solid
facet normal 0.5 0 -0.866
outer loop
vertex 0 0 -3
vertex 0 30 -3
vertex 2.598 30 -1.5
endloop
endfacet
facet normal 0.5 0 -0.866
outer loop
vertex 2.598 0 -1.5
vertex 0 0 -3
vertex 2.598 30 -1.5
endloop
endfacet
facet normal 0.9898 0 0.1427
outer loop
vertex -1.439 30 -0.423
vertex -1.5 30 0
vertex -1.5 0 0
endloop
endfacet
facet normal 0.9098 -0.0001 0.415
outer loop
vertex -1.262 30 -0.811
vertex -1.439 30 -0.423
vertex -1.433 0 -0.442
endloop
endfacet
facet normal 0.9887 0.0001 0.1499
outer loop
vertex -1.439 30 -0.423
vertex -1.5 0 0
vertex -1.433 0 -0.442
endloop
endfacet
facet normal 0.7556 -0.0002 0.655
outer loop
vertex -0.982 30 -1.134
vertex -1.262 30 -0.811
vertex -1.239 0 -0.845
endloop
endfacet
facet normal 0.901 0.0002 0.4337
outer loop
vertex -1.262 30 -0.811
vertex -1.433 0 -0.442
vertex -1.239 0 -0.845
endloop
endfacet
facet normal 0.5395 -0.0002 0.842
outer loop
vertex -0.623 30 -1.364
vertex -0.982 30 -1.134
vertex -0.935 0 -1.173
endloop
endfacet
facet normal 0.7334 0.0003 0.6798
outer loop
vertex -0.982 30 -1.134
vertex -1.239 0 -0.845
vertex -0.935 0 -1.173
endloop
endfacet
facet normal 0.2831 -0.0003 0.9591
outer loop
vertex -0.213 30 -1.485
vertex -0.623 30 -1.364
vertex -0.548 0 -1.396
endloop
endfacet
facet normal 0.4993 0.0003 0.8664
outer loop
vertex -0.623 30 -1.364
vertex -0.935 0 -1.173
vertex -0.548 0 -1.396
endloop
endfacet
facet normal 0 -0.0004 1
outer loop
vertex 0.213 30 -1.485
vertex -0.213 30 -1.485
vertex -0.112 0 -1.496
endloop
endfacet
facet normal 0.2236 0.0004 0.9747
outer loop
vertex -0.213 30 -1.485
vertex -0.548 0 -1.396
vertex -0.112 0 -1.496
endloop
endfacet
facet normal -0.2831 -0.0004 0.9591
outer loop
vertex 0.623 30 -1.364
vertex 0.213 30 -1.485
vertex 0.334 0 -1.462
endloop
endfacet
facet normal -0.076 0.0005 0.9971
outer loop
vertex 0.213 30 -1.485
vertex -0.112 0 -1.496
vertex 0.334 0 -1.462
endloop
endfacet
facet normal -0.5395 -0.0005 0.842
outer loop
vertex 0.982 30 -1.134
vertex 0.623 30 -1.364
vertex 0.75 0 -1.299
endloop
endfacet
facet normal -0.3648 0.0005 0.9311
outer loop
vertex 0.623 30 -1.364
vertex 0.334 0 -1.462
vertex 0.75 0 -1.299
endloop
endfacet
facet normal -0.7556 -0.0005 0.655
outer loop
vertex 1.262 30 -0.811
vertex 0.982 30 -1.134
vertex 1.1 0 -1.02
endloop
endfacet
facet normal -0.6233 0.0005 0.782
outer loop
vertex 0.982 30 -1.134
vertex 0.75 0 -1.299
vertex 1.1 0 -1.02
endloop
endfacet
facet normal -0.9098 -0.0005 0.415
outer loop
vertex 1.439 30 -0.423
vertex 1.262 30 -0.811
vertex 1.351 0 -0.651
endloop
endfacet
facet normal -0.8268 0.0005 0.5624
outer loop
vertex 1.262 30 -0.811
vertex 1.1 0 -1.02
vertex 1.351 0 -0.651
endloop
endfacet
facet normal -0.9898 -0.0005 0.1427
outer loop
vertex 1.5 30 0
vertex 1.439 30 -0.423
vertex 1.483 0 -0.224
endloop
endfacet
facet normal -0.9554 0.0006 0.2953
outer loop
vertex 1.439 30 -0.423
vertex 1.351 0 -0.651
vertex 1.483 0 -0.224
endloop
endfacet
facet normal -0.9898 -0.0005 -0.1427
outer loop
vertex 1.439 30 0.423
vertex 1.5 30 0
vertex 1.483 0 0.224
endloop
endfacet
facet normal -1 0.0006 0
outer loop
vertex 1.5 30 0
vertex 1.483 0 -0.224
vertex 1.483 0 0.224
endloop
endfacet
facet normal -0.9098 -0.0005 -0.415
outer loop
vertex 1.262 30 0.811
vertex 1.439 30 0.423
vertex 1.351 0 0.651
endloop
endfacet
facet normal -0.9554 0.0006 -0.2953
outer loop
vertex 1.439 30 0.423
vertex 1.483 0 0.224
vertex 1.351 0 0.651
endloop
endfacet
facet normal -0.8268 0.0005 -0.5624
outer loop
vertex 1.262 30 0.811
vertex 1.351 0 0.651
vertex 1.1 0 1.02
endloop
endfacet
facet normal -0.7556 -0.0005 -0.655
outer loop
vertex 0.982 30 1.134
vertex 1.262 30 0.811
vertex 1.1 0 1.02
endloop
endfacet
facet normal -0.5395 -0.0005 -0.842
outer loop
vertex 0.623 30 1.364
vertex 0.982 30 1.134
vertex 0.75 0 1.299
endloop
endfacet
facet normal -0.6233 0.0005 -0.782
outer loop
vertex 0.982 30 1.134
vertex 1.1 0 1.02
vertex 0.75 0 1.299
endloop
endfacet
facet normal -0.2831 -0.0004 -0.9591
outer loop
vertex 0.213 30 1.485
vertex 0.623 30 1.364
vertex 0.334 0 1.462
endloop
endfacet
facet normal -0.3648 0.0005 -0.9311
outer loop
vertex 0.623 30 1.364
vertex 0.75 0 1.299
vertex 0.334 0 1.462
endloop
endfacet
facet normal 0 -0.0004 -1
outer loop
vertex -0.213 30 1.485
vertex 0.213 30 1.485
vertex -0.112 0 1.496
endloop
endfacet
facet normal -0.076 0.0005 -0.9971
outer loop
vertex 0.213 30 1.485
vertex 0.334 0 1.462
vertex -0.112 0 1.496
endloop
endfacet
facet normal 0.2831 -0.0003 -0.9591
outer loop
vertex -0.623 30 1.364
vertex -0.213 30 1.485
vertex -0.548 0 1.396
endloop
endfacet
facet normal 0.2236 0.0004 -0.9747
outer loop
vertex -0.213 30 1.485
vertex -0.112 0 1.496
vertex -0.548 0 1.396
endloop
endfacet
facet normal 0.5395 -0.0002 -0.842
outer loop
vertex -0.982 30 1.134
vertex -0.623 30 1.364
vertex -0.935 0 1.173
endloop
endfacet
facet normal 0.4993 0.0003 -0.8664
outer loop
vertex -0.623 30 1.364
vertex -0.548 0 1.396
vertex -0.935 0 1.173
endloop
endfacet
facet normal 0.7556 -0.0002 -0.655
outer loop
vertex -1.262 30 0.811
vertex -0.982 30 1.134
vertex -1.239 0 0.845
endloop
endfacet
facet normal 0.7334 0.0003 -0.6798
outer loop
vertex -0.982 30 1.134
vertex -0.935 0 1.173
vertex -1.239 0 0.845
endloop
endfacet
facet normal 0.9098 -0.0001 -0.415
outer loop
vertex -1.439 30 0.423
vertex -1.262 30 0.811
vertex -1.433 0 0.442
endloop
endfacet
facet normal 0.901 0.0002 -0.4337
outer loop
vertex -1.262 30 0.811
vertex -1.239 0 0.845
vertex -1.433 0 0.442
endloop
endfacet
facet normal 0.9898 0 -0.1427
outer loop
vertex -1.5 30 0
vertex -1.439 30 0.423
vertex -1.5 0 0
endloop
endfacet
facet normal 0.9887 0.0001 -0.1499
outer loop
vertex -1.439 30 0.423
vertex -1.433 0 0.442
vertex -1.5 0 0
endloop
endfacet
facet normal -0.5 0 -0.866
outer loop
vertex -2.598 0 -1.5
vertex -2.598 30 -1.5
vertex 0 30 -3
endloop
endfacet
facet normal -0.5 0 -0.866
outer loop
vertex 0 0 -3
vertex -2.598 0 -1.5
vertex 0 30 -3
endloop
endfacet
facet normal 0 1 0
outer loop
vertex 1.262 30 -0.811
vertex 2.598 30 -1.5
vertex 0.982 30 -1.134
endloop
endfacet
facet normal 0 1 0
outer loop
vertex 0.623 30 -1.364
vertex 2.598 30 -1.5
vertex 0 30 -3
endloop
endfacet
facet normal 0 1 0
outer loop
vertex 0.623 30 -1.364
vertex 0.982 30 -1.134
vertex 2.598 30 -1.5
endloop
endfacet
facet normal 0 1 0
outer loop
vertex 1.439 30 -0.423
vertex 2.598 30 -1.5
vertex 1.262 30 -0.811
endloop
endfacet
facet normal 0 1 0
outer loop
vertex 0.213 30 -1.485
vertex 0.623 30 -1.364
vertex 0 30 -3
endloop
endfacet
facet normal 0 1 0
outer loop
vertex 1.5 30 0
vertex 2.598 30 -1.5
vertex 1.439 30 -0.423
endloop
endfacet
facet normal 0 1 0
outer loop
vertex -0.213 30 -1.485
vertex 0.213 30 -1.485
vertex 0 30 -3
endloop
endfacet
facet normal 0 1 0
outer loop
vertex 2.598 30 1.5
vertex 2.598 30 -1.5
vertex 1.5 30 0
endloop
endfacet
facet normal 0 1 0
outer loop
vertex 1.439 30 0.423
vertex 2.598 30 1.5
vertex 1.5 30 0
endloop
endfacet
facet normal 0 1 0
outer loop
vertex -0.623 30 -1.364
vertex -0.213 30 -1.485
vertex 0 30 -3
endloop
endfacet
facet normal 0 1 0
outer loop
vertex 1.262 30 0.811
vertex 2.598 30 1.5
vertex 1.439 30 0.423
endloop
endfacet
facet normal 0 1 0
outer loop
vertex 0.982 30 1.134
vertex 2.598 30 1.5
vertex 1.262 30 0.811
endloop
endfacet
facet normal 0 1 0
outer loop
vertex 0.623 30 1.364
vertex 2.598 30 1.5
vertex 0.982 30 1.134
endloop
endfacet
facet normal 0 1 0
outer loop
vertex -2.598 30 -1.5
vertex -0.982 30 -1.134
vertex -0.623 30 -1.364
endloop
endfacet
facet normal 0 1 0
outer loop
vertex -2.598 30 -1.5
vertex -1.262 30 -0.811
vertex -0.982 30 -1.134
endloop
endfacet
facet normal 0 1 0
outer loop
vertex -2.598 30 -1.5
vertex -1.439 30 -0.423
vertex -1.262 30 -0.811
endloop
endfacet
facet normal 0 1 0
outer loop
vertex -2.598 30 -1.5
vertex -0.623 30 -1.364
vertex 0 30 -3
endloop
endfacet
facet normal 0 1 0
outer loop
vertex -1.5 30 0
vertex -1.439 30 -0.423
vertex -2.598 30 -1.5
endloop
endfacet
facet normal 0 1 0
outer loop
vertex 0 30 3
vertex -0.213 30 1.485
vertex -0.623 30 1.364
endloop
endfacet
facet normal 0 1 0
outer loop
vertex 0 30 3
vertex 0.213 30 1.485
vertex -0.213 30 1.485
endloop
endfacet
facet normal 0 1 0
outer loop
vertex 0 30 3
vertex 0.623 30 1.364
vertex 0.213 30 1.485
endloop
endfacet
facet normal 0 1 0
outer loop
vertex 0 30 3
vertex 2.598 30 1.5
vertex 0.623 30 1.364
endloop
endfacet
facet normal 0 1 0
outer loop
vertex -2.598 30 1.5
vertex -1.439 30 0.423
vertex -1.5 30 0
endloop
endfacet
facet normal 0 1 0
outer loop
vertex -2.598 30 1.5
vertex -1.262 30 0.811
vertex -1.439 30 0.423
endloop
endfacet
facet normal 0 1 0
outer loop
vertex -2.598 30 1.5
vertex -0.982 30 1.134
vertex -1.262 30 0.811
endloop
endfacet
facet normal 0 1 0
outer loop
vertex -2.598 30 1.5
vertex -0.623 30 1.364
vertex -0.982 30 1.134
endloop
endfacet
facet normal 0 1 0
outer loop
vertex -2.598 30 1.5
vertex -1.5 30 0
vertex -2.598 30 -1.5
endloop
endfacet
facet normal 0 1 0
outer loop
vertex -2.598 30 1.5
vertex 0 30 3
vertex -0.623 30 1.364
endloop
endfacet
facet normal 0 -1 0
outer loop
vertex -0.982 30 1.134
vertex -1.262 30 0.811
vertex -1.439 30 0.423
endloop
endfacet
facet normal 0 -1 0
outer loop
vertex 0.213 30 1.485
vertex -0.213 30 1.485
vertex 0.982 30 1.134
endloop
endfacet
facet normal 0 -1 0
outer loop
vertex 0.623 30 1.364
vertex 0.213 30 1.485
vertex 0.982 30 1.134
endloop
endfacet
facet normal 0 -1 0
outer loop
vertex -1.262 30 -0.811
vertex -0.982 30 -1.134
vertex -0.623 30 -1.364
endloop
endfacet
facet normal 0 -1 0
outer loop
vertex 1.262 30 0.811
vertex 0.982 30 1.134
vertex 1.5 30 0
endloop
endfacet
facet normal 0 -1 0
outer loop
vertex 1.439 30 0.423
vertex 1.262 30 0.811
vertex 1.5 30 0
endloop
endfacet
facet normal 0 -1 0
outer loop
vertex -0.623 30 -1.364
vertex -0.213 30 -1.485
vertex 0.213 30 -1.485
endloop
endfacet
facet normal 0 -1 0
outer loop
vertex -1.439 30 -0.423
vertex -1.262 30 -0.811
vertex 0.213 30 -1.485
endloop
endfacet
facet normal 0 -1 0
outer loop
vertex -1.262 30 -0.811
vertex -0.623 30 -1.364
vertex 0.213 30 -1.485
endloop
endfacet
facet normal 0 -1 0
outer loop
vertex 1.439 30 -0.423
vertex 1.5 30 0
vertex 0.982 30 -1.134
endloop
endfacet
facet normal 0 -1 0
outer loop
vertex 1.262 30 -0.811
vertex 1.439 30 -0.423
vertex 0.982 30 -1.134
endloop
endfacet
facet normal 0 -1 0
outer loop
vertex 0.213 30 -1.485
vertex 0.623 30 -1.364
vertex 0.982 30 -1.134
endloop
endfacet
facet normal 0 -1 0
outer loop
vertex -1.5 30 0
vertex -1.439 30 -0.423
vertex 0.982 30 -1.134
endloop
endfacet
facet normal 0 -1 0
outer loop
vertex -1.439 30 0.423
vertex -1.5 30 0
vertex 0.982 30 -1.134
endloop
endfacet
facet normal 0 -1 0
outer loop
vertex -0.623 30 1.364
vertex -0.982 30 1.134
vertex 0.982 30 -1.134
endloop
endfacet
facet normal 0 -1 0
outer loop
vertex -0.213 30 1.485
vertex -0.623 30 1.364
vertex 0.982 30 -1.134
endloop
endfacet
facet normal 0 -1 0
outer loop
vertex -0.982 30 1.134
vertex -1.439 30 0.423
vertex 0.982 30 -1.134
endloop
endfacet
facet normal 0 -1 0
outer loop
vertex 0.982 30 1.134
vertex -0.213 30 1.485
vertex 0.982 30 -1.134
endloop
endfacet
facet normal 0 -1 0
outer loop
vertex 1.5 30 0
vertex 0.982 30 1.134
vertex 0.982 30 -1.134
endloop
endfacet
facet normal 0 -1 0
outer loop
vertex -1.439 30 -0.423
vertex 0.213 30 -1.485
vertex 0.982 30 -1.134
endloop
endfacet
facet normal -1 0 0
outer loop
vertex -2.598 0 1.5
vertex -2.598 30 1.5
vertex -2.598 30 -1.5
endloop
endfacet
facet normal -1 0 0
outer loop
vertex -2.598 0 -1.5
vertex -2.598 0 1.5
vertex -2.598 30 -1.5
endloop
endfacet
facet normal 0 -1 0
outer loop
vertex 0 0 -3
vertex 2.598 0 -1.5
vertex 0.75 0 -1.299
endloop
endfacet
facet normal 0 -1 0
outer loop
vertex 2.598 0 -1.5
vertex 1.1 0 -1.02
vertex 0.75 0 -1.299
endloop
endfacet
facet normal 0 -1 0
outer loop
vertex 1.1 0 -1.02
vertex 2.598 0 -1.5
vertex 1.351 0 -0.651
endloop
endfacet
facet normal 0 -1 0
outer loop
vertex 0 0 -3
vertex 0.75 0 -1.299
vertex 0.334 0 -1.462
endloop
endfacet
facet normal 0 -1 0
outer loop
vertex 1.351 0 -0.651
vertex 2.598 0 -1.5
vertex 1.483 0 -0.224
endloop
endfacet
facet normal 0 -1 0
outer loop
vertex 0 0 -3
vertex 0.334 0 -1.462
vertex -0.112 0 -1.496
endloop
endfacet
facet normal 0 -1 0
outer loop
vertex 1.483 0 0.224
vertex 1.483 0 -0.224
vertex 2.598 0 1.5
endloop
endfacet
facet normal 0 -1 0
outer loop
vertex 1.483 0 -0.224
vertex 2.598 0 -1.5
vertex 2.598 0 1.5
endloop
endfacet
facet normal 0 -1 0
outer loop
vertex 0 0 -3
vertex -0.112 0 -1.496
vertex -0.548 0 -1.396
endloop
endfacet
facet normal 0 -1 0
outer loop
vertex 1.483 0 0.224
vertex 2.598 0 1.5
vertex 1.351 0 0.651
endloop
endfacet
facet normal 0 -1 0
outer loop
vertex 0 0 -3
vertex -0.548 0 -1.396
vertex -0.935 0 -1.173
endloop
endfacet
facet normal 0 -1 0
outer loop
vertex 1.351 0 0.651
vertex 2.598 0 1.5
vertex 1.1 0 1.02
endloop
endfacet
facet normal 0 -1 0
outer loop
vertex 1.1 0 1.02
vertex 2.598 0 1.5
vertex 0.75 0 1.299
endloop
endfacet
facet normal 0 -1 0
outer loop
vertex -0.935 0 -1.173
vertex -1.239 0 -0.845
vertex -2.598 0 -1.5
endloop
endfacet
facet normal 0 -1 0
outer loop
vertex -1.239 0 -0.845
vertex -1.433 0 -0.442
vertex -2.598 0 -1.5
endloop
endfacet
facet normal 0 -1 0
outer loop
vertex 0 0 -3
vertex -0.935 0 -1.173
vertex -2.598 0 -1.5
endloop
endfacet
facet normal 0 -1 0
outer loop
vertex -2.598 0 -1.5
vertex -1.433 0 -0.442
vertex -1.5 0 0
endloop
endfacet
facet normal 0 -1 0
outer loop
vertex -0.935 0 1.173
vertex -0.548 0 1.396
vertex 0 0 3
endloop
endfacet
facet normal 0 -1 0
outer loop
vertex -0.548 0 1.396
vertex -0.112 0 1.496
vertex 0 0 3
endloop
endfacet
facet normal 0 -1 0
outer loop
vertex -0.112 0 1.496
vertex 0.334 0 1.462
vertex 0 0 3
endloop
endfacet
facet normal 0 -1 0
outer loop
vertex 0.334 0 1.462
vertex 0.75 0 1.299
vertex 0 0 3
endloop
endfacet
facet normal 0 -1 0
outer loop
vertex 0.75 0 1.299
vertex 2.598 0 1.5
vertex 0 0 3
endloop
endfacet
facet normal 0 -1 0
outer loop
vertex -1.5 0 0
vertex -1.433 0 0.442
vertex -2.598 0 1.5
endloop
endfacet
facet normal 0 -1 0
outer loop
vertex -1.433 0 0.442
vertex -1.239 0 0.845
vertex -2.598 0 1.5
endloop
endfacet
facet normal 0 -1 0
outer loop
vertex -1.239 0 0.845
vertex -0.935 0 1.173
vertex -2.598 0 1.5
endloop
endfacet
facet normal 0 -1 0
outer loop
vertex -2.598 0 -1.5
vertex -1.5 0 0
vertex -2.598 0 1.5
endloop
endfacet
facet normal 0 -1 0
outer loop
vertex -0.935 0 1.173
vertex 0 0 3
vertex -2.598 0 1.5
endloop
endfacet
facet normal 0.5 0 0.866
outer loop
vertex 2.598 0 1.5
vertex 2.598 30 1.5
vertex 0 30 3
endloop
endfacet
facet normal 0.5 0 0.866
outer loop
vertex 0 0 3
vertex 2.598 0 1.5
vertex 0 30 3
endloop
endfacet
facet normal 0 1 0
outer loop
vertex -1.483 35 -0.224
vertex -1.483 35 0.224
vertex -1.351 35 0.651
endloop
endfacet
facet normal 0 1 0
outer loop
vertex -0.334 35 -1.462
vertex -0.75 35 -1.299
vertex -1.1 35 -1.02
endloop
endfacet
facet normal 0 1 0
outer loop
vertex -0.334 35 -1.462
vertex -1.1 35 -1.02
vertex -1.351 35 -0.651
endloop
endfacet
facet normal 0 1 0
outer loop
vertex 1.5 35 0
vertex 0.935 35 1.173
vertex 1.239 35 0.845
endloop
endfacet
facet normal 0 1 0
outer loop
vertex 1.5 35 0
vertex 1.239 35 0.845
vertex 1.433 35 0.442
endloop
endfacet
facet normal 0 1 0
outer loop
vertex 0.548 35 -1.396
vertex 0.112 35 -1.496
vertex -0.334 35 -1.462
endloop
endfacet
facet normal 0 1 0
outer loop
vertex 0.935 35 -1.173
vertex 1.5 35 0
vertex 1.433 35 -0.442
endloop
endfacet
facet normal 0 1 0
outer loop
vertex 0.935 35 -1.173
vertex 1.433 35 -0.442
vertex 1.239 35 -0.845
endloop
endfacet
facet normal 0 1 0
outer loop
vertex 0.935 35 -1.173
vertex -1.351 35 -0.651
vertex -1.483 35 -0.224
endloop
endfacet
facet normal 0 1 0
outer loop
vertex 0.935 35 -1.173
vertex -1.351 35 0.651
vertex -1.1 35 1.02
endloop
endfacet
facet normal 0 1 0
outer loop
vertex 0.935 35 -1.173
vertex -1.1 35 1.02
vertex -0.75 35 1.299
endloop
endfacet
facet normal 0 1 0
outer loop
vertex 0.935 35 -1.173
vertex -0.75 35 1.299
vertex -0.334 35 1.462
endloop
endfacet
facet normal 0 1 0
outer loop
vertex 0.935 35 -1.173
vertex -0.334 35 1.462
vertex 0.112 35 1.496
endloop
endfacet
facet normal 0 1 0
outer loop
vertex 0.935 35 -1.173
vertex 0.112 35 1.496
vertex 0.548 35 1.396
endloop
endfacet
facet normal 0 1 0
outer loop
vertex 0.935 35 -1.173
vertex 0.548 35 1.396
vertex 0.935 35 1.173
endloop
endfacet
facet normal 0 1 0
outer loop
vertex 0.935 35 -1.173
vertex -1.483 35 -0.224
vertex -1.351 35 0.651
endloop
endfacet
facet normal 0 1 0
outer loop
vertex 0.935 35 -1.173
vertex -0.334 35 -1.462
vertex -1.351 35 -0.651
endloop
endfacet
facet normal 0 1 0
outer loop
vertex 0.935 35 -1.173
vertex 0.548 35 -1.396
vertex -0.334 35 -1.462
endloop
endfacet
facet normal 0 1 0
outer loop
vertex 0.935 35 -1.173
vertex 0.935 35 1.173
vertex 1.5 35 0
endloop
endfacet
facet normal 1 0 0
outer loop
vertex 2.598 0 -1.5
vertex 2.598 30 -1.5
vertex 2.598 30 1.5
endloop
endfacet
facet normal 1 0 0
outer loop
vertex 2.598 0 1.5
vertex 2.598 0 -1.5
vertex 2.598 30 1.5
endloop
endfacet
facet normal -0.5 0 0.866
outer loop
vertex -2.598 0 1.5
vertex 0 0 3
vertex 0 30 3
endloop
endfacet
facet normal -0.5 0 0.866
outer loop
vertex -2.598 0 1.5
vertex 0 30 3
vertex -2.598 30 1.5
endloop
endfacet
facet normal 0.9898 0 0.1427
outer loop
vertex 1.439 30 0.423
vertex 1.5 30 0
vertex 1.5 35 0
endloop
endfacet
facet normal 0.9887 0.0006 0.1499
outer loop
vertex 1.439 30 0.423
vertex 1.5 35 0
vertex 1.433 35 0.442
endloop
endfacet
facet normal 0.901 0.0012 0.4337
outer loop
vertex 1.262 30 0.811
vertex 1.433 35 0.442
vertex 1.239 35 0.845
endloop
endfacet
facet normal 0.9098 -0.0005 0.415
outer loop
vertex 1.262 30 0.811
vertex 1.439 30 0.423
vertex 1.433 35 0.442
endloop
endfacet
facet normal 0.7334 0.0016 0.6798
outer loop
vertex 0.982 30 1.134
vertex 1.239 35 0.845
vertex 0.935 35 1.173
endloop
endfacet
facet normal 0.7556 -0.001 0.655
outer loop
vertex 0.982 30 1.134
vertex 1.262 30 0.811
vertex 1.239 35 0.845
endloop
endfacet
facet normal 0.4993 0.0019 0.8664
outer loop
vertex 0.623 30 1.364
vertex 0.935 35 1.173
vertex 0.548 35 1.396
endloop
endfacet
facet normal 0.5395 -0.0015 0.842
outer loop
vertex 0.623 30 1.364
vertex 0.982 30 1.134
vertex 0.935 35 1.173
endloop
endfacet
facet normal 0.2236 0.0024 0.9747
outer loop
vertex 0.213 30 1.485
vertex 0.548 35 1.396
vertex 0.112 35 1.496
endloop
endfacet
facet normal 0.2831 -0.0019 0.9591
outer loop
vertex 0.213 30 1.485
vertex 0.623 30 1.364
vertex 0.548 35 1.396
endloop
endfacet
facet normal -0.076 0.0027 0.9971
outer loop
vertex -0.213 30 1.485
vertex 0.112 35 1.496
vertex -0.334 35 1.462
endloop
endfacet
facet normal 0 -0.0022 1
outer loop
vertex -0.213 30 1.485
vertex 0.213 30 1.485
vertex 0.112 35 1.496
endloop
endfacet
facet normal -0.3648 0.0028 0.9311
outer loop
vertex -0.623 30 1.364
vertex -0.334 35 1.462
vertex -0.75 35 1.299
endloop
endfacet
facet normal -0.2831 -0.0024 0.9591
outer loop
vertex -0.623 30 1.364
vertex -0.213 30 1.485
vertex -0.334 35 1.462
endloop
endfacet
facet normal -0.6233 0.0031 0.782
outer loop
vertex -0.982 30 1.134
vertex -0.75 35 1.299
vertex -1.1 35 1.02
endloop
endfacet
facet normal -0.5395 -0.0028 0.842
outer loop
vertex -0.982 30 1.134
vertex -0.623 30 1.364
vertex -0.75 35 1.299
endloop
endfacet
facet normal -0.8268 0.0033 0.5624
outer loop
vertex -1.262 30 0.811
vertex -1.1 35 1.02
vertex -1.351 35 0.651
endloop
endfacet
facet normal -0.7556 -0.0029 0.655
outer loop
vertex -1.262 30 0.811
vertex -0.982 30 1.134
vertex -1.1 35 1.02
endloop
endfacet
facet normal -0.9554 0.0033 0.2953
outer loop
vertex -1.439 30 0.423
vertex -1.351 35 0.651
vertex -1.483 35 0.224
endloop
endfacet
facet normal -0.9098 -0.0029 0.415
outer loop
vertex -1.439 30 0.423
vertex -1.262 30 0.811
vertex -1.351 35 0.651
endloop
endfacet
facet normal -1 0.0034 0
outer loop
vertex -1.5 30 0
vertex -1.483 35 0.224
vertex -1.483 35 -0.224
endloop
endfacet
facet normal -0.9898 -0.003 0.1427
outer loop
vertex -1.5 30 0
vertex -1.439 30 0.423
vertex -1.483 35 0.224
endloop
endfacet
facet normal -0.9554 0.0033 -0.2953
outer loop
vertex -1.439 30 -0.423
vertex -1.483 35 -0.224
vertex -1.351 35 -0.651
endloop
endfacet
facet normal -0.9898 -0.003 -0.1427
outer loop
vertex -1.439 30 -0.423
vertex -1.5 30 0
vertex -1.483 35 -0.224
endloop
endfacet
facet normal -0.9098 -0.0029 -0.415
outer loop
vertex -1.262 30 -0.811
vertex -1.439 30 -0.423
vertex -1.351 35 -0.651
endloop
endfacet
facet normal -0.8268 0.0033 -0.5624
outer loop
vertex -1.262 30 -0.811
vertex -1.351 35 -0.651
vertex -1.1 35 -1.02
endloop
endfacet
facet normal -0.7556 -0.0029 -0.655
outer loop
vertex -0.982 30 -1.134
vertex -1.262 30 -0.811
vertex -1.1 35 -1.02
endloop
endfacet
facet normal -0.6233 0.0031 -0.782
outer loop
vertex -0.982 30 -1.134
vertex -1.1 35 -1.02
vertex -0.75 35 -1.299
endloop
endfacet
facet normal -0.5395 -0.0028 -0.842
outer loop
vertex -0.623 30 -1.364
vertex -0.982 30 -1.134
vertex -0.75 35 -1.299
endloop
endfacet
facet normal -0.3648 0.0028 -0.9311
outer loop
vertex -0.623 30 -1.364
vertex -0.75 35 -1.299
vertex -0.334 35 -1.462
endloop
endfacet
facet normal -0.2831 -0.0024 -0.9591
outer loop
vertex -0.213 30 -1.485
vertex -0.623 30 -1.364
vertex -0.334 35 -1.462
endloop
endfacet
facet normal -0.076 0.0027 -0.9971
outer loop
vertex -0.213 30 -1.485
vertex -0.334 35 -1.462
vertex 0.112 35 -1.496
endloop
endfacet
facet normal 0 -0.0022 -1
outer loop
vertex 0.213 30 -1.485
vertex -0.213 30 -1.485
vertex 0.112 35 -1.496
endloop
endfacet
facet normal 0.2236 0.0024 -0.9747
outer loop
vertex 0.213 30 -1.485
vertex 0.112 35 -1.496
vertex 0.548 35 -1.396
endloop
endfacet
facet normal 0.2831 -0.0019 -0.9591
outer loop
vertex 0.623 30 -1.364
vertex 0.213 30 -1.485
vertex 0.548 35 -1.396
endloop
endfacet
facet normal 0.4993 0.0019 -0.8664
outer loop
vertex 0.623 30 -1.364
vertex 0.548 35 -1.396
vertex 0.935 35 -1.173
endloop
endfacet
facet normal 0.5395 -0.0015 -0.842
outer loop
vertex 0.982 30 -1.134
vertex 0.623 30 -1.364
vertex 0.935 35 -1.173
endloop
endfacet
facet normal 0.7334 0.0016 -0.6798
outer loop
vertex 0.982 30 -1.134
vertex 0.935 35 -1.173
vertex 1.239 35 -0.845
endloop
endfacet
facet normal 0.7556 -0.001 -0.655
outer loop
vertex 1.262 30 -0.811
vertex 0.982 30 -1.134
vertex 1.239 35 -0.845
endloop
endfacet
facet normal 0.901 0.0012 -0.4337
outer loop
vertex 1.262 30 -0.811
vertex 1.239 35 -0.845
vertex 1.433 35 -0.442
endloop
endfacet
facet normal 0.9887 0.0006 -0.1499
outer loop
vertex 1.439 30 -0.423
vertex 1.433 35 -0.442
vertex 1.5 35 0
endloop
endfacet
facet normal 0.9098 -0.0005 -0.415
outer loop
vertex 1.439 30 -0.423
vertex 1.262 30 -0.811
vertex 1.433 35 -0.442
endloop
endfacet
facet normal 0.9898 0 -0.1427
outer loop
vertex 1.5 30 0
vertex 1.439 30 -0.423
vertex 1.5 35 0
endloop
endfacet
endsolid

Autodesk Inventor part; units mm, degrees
ref_plane "YZ Plane" through (0, 0, 0) normal (1, 0, 0) x (0, 1, 0)
ref_plane "XZ Plane" through (0, 0, 0) normal (0, 1, 0) x (-1, 0, 0)
ref_plane "XY Plane" through (0, 0, 0) normal (0, 0, 1) x (1, 0, 0)
sketch "Sketch1" plane through (0, 0, 0) normal (0, 1, 0) x (-1, 0, 0)
  circle A0 centre (0, 0) radius 1.5
  line L0 (0, -3) -> (-2.5981, -1.5)
  line L1 (-2.5981, -1.5) -> (-2.5981, 1.5)
  line L2 (-2.5981, 1.5) -> (0, 3)
  line L3 (0, 3) -> (2.5981, 1.5)
  line L4 (2.5981, 1.5) -> (2.5981, -1.5)
  line L5 (2.5981, -1.5) -> (0, -3)
  dimension "d0" = 3
  dimension "d1" = 3
extrude "Extrusion1" add sketch "Sketch1" along normal blind 30
sketch "Sketch2" plane through (0, 30, 0) normal (0, 1, 0) x (1, 0, 0)
  circle A0 centre (0, 0) radius 1.5
  dimension "d4" = 3
extrude "Extrusion2" add sketch "Sketch2" along normal blind 5
thread "Thread1" size "M3x0.5" class "6g" standard "ANSI Metric M Profile" full length
properties part number "30mm_dist" material "Brass, Soft Yellow"
